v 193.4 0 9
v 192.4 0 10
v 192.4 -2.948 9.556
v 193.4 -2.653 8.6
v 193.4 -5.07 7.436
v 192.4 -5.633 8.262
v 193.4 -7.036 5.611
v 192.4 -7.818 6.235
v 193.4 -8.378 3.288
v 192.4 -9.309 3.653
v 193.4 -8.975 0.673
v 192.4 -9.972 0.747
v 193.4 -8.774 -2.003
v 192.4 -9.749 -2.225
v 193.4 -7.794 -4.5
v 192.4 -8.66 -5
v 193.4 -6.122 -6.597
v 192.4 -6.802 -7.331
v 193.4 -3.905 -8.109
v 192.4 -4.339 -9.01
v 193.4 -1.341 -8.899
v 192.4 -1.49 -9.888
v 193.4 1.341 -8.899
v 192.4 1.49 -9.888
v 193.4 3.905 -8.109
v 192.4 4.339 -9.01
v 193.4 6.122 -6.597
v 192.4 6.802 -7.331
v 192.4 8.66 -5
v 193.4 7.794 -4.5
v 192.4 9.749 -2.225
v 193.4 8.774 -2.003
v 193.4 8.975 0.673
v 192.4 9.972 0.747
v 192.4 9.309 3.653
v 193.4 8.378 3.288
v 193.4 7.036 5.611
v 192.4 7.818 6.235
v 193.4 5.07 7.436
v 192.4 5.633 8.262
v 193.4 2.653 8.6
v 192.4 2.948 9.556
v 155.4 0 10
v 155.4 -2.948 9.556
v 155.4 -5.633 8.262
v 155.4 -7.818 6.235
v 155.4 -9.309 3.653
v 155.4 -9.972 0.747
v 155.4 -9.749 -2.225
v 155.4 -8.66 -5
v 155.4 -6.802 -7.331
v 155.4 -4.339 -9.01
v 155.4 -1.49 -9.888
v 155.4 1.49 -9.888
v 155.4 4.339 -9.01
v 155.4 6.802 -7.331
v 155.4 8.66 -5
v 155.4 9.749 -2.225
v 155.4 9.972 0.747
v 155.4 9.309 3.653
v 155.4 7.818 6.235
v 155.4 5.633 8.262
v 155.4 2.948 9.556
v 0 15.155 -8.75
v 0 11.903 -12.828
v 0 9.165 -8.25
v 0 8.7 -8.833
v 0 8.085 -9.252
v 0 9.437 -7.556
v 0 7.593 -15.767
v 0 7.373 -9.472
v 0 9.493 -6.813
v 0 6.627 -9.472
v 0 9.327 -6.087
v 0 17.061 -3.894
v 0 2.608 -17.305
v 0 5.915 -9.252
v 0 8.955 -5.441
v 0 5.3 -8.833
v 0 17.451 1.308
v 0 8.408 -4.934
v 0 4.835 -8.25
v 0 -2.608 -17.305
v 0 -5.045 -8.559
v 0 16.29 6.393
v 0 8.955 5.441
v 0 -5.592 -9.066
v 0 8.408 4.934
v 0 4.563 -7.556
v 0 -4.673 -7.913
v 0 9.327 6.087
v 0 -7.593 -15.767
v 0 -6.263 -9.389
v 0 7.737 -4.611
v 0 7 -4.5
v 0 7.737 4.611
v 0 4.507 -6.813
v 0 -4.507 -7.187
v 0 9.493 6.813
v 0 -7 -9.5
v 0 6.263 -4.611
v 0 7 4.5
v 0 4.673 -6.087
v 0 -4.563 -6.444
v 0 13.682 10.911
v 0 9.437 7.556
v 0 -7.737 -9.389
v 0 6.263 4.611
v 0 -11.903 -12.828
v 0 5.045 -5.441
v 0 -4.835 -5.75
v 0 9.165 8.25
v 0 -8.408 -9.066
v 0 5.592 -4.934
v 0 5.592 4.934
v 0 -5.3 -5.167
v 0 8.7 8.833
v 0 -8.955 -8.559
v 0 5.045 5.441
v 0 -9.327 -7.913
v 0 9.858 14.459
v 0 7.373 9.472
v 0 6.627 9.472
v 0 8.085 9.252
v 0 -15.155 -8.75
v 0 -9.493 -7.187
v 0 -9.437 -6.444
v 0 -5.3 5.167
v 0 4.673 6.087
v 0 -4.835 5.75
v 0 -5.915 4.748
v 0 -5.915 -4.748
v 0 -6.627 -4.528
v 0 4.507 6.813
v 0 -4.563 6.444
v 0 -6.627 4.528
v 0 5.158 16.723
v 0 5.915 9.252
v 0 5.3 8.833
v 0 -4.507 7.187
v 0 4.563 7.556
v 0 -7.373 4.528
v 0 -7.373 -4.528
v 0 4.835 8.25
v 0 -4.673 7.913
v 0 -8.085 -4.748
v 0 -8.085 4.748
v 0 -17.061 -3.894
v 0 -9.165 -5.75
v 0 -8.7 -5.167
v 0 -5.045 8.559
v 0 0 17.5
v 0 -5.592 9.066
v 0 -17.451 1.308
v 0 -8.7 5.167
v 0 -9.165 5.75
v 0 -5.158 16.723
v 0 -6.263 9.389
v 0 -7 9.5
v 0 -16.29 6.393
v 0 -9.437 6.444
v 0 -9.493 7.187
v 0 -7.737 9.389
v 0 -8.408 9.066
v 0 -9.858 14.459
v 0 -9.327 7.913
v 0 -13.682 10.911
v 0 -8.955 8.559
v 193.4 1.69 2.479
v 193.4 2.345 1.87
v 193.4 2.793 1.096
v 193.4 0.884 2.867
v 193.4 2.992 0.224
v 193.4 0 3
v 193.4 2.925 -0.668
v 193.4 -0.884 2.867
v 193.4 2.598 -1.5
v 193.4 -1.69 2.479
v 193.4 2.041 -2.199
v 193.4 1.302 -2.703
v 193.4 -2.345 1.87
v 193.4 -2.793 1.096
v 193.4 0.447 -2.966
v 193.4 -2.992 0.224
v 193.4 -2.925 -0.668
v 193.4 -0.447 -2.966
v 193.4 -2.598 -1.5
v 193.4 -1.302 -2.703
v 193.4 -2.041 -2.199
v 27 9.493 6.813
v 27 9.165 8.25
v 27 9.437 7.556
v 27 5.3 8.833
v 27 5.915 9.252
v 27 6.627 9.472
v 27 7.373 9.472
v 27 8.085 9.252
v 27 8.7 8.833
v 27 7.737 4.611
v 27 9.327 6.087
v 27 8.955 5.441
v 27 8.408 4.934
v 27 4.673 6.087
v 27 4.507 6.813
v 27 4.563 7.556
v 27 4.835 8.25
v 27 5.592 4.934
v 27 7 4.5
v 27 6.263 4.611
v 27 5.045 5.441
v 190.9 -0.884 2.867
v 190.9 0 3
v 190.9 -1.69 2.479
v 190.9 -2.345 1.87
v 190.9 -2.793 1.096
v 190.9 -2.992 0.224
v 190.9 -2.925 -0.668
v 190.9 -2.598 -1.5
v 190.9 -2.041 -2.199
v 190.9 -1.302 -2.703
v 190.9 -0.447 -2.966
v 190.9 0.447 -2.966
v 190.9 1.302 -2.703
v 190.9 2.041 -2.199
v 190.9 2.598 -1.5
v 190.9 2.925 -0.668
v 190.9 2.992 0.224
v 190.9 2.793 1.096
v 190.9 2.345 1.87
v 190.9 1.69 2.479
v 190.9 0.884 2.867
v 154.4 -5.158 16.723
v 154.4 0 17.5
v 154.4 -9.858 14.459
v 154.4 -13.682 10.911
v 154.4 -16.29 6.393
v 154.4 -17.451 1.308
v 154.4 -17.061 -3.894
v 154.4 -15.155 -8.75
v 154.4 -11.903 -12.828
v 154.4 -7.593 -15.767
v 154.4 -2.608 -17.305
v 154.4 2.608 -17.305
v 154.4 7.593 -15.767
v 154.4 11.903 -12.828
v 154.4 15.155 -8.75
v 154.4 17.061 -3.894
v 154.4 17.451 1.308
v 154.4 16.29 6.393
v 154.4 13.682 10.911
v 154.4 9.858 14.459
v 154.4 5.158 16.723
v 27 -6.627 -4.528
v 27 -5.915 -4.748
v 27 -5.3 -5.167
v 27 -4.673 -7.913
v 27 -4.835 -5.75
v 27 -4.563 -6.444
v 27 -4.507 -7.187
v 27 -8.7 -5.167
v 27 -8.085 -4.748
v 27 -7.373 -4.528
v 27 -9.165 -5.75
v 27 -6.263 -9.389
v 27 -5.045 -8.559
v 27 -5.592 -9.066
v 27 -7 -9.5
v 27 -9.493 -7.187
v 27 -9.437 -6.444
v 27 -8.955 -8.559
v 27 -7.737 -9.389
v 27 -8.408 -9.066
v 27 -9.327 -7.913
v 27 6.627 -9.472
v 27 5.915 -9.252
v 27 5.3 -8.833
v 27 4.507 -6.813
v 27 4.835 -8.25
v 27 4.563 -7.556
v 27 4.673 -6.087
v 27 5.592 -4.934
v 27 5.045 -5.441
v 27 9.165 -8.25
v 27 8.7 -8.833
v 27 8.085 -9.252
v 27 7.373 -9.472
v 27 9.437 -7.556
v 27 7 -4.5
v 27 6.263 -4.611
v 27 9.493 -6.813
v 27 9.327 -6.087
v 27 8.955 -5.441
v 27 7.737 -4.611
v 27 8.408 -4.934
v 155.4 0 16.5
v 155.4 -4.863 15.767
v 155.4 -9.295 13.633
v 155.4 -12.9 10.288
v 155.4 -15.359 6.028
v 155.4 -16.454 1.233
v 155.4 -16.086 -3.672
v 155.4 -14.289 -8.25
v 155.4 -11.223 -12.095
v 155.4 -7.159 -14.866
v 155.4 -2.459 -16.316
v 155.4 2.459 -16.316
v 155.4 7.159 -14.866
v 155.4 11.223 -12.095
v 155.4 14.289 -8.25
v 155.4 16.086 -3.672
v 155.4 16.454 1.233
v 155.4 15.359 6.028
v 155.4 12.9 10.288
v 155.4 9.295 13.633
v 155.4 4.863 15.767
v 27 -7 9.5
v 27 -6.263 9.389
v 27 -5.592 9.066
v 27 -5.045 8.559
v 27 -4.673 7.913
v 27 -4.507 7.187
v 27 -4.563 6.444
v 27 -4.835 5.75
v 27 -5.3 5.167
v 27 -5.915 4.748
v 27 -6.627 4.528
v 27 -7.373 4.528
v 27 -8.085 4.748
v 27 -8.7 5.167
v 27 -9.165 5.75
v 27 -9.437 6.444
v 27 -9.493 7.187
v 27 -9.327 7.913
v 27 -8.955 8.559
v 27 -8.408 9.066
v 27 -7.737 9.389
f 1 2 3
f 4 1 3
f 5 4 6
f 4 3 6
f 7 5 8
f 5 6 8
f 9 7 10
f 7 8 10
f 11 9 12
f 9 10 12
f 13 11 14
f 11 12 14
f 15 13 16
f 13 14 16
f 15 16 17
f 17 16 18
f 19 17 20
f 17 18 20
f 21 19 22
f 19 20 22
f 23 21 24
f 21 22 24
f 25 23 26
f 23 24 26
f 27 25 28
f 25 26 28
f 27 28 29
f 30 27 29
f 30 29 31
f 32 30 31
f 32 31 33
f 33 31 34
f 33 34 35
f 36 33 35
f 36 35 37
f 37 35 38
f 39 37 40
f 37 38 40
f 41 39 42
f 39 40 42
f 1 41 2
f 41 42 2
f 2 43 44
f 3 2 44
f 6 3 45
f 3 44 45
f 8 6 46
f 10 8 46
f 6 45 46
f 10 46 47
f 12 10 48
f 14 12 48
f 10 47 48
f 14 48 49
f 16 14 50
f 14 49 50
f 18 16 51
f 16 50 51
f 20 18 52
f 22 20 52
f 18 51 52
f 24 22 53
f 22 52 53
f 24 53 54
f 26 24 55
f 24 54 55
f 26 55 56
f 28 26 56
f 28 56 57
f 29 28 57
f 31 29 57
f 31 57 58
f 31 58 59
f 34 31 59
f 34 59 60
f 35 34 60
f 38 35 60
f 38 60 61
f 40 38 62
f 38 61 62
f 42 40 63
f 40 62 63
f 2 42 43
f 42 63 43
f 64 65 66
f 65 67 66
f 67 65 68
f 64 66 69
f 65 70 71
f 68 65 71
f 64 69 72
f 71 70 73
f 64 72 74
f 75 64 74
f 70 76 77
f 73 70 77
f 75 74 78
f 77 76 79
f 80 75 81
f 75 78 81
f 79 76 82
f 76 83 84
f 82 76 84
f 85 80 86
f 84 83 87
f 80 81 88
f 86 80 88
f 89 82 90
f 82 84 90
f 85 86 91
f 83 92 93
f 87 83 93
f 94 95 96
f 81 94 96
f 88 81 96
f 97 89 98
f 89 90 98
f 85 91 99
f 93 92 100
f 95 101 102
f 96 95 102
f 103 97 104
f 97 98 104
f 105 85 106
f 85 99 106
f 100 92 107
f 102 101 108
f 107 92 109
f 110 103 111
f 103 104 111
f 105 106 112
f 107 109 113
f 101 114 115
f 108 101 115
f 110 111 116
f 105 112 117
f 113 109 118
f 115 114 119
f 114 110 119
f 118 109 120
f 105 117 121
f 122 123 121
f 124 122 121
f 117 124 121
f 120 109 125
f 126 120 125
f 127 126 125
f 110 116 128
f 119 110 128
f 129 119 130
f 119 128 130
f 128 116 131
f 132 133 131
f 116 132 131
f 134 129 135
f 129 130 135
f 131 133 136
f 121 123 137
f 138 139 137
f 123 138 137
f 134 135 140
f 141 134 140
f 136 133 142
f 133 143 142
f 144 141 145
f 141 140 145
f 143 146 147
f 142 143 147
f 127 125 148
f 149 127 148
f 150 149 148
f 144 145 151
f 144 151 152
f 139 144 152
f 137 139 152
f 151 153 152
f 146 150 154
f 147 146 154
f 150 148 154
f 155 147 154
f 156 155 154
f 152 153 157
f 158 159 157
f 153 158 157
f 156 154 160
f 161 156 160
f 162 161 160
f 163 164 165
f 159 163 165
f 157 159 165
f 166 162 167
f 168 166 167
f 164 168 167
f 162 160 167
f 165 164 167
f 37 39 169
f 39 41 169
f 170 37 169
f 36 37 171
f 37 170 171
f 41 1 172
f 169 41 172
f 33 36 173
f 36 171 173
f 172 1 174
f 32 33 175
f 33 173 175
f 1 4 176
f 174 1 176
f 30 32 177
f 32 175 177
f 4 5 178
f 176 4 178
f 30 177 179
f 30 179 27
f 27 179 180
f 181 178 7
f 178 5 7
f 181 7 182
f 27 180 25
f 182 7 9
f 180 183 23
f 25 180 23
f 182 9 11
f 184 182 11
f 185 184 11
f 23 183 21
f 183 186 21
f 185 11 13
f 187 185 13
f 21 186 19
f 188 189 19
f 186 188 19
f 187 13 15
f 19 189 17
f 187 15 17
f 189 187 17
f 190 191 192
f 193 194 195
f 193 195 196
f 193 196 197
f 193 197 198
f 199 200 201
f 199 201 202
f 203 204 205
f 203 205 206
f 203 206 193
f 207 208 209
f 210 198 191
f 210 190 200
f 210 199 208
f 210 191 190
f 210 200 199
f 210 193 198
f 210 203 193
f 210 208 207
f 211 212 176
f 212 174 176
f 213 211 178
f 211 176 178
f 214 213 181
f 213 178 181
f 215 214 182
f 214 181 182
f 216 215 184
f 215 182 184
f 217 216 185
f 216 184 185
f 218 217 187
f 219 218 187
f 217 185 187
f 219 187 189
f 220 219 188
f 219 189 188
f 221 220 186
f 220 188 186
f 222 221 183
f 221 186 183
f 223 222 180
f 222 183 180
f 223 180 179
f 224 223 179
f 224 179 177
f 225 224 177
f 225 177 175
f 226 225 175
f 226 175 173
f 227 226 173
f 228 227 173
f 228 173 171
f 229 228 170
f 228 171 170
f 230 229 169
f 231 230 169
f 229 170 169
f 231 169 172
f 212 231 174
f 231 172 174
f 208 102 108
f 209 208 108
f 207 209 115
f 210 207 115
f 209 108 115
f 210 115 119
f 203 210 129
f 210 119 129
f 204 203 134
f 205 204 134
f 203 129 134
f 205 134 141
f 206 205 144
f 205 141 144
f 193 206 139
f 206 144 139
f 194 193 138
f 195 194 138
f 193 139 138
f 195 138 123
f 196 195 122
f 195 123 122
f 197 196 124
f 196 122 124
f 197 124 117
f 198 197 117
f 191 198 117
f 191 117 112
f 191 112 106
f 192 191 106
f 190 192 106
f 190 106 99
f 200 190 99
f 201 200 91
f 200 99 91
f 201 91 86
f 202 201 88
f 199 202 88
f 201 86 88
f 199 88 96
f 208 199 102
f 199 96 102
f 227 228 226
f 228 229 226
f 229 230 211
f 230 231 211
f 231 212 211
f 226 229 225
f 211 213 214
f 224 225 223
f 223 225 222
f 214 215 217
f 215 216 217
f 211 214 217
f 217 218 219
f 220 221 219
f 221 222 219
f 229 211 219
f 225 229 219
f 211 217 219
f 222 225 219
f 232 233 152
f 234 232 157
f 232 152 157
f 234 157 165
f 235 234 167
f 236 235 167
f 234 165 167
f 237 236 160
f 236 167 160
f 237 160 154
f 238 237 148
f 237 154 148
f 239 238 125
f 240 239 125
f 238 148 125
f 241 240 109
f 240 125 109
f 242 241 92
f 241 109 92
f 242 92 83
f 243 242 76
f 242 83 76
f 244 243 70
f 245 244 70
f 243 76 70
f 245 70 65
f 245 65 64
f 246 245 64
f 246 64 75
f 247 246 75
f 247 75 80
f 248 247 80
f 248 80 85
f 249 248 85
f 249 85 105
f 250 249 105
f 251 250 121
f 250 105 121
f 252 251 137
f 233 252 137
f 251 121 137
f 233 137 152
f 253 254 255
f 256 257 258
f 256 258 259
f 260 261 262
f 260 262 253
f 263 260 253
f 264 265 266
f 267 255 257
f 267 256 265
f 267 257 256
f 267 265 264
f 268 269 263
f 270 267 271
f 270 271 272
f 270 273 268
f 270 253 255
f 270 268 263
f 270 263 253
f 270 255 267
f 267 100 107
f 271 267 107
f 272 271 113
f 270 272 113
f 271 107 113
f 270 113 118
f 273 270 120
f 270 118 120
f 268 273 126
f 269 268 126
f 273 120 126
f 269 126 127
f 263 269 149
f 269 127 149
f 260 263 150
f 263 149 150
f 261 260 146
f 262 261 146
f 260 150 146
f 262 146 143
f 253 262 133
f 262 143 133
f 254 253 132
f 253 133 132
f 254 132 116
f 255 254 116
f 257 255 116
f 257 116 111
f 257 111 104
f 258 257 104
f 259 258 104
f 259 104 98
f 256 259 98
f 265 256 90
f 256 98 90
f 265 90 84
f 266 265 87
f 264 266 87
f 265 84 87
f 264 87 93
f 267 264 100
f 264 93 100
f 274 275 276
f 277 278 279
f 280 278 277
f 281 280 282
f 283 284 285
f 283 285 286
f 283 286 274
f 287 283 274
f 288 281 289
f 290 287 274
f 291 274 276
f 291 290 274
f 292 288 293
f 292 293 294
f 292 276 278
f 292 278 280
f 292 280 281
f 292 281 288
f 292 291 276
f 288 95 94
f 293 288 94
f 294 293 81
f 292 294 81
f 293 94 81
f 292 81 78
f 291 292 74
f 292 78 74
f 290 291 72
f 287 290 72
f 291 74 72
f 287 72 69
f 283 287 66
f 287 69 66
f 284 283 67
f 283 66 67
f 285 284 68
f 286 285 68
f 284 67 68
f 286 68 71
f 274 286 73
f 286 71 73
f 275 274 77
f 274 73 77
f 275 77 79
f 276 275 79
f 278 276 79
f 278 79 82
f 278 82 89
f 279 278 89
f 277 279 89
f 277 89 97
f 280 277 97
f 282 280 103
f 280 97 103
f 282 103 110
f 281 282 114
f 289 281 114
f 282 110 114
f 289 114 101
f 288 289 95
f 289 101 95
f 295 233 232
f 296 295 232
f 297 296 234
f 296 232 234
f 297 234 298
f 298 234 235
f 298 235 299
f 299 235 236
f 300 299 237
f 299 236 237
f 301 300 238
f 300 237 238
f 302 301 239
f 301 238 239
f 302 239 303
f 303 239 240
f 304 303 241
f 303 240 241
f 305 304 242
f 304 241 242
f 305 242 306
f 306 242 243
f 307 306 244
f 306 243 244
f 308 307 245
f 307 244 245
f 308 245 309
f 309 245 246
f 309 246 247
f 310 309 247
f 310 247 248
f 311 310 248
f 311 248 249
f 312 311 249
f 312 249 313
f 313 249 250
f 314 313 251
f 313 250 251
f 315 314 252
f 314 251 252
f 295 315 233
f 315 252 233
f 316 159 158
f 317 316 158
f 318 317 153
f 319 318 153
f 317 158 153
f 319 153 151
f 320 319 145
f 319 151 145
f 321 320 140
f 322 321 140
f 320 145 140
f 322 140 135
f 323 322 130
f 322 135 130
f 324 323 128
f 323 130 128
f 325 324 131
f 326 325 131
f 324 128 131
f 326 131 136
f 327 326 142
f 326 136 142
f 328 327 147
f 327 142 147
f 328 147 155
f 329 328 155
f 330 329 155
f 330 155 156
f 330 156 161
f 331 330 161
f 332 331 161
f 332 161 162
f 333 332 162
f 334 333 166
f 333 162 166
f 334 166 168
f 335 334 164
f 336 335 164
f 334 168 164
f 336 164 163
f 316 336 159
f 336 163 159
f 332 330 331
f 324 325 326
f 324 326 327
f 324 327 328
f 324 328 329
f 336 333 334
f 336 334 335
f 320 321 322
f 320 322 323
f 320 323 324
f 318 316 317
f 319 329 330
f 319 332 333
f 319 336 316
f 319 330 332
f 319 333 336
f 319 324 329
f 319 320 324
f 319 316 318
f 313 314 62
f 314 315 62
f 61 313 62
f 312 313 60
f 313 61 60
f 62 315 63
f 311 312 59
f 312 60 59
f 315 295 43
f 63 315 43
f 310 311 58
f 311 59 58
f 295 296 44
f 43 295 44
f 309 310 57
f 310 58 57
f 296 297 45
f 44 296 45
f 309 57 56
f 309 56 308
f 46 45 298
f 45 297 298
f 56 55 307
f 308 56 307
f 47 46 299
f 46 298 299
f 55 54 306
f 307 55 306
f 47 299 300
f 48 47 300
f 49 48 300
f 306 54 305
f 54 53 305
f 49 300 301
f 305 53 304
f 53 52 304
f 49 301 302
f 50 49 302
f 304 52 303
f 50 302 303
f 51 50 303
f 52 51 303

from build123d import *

# Parameters (mm, degrees)
CHAMFER1_SIZE      = 1
SKETCH2_R          = 2.5
CUT_EXTRUDE1_DEPTH = 27


with BuildPart() as part:
    # Sketch1 → Revolve1 (revolve)
    with BuildSketch(Plane.XY, mode=Mode.PRIVATE) as revolve1_sk:
        Polygon((190.9, 0), (190.9, 3), (193.4, 3), (193.4, 10), (155.4, 10), (155.4, 17.5), (0, 17.5), (0, 0), align=None)
    revolve(revolve1_sk.sketch.rotate(Axis((0, 0, 0), (1, 0, 0)), 90), axis=Axis((0, 0, 0), (1, 0, 0)))

    # Chamfer1
    chamfer1_edges = [part.edges().sort_by_distance(p)[0] for p in [
        (193.4, 0, -10),
        (155.4, 0, -17.5),
    ]]
    chamfer(chamfer1_edges, length=CHAMFER1_SIZE)

    # Sketch2 → Cut-Extrude1 (cut)
    with BuildSketch(Plane.ZY):
        with Locations((-7, 7)):
            Circle(SKETCH2_R)
        with Locations(Location((7, 7, 0), (0, 0, 180))):
            Circle(SKETCH2_R)
        with Locations((7, -7)):
            Circle(SKETCH2_R)
        with Locations(Location((-7, -7, 0), (0, 0, 180))):
            Circle(SKETCH2_R)
    extrude(amount=-CUT_EXTRUDE1_DEPTH, mode=Mode.SUBTRACT)


solid = part.part
